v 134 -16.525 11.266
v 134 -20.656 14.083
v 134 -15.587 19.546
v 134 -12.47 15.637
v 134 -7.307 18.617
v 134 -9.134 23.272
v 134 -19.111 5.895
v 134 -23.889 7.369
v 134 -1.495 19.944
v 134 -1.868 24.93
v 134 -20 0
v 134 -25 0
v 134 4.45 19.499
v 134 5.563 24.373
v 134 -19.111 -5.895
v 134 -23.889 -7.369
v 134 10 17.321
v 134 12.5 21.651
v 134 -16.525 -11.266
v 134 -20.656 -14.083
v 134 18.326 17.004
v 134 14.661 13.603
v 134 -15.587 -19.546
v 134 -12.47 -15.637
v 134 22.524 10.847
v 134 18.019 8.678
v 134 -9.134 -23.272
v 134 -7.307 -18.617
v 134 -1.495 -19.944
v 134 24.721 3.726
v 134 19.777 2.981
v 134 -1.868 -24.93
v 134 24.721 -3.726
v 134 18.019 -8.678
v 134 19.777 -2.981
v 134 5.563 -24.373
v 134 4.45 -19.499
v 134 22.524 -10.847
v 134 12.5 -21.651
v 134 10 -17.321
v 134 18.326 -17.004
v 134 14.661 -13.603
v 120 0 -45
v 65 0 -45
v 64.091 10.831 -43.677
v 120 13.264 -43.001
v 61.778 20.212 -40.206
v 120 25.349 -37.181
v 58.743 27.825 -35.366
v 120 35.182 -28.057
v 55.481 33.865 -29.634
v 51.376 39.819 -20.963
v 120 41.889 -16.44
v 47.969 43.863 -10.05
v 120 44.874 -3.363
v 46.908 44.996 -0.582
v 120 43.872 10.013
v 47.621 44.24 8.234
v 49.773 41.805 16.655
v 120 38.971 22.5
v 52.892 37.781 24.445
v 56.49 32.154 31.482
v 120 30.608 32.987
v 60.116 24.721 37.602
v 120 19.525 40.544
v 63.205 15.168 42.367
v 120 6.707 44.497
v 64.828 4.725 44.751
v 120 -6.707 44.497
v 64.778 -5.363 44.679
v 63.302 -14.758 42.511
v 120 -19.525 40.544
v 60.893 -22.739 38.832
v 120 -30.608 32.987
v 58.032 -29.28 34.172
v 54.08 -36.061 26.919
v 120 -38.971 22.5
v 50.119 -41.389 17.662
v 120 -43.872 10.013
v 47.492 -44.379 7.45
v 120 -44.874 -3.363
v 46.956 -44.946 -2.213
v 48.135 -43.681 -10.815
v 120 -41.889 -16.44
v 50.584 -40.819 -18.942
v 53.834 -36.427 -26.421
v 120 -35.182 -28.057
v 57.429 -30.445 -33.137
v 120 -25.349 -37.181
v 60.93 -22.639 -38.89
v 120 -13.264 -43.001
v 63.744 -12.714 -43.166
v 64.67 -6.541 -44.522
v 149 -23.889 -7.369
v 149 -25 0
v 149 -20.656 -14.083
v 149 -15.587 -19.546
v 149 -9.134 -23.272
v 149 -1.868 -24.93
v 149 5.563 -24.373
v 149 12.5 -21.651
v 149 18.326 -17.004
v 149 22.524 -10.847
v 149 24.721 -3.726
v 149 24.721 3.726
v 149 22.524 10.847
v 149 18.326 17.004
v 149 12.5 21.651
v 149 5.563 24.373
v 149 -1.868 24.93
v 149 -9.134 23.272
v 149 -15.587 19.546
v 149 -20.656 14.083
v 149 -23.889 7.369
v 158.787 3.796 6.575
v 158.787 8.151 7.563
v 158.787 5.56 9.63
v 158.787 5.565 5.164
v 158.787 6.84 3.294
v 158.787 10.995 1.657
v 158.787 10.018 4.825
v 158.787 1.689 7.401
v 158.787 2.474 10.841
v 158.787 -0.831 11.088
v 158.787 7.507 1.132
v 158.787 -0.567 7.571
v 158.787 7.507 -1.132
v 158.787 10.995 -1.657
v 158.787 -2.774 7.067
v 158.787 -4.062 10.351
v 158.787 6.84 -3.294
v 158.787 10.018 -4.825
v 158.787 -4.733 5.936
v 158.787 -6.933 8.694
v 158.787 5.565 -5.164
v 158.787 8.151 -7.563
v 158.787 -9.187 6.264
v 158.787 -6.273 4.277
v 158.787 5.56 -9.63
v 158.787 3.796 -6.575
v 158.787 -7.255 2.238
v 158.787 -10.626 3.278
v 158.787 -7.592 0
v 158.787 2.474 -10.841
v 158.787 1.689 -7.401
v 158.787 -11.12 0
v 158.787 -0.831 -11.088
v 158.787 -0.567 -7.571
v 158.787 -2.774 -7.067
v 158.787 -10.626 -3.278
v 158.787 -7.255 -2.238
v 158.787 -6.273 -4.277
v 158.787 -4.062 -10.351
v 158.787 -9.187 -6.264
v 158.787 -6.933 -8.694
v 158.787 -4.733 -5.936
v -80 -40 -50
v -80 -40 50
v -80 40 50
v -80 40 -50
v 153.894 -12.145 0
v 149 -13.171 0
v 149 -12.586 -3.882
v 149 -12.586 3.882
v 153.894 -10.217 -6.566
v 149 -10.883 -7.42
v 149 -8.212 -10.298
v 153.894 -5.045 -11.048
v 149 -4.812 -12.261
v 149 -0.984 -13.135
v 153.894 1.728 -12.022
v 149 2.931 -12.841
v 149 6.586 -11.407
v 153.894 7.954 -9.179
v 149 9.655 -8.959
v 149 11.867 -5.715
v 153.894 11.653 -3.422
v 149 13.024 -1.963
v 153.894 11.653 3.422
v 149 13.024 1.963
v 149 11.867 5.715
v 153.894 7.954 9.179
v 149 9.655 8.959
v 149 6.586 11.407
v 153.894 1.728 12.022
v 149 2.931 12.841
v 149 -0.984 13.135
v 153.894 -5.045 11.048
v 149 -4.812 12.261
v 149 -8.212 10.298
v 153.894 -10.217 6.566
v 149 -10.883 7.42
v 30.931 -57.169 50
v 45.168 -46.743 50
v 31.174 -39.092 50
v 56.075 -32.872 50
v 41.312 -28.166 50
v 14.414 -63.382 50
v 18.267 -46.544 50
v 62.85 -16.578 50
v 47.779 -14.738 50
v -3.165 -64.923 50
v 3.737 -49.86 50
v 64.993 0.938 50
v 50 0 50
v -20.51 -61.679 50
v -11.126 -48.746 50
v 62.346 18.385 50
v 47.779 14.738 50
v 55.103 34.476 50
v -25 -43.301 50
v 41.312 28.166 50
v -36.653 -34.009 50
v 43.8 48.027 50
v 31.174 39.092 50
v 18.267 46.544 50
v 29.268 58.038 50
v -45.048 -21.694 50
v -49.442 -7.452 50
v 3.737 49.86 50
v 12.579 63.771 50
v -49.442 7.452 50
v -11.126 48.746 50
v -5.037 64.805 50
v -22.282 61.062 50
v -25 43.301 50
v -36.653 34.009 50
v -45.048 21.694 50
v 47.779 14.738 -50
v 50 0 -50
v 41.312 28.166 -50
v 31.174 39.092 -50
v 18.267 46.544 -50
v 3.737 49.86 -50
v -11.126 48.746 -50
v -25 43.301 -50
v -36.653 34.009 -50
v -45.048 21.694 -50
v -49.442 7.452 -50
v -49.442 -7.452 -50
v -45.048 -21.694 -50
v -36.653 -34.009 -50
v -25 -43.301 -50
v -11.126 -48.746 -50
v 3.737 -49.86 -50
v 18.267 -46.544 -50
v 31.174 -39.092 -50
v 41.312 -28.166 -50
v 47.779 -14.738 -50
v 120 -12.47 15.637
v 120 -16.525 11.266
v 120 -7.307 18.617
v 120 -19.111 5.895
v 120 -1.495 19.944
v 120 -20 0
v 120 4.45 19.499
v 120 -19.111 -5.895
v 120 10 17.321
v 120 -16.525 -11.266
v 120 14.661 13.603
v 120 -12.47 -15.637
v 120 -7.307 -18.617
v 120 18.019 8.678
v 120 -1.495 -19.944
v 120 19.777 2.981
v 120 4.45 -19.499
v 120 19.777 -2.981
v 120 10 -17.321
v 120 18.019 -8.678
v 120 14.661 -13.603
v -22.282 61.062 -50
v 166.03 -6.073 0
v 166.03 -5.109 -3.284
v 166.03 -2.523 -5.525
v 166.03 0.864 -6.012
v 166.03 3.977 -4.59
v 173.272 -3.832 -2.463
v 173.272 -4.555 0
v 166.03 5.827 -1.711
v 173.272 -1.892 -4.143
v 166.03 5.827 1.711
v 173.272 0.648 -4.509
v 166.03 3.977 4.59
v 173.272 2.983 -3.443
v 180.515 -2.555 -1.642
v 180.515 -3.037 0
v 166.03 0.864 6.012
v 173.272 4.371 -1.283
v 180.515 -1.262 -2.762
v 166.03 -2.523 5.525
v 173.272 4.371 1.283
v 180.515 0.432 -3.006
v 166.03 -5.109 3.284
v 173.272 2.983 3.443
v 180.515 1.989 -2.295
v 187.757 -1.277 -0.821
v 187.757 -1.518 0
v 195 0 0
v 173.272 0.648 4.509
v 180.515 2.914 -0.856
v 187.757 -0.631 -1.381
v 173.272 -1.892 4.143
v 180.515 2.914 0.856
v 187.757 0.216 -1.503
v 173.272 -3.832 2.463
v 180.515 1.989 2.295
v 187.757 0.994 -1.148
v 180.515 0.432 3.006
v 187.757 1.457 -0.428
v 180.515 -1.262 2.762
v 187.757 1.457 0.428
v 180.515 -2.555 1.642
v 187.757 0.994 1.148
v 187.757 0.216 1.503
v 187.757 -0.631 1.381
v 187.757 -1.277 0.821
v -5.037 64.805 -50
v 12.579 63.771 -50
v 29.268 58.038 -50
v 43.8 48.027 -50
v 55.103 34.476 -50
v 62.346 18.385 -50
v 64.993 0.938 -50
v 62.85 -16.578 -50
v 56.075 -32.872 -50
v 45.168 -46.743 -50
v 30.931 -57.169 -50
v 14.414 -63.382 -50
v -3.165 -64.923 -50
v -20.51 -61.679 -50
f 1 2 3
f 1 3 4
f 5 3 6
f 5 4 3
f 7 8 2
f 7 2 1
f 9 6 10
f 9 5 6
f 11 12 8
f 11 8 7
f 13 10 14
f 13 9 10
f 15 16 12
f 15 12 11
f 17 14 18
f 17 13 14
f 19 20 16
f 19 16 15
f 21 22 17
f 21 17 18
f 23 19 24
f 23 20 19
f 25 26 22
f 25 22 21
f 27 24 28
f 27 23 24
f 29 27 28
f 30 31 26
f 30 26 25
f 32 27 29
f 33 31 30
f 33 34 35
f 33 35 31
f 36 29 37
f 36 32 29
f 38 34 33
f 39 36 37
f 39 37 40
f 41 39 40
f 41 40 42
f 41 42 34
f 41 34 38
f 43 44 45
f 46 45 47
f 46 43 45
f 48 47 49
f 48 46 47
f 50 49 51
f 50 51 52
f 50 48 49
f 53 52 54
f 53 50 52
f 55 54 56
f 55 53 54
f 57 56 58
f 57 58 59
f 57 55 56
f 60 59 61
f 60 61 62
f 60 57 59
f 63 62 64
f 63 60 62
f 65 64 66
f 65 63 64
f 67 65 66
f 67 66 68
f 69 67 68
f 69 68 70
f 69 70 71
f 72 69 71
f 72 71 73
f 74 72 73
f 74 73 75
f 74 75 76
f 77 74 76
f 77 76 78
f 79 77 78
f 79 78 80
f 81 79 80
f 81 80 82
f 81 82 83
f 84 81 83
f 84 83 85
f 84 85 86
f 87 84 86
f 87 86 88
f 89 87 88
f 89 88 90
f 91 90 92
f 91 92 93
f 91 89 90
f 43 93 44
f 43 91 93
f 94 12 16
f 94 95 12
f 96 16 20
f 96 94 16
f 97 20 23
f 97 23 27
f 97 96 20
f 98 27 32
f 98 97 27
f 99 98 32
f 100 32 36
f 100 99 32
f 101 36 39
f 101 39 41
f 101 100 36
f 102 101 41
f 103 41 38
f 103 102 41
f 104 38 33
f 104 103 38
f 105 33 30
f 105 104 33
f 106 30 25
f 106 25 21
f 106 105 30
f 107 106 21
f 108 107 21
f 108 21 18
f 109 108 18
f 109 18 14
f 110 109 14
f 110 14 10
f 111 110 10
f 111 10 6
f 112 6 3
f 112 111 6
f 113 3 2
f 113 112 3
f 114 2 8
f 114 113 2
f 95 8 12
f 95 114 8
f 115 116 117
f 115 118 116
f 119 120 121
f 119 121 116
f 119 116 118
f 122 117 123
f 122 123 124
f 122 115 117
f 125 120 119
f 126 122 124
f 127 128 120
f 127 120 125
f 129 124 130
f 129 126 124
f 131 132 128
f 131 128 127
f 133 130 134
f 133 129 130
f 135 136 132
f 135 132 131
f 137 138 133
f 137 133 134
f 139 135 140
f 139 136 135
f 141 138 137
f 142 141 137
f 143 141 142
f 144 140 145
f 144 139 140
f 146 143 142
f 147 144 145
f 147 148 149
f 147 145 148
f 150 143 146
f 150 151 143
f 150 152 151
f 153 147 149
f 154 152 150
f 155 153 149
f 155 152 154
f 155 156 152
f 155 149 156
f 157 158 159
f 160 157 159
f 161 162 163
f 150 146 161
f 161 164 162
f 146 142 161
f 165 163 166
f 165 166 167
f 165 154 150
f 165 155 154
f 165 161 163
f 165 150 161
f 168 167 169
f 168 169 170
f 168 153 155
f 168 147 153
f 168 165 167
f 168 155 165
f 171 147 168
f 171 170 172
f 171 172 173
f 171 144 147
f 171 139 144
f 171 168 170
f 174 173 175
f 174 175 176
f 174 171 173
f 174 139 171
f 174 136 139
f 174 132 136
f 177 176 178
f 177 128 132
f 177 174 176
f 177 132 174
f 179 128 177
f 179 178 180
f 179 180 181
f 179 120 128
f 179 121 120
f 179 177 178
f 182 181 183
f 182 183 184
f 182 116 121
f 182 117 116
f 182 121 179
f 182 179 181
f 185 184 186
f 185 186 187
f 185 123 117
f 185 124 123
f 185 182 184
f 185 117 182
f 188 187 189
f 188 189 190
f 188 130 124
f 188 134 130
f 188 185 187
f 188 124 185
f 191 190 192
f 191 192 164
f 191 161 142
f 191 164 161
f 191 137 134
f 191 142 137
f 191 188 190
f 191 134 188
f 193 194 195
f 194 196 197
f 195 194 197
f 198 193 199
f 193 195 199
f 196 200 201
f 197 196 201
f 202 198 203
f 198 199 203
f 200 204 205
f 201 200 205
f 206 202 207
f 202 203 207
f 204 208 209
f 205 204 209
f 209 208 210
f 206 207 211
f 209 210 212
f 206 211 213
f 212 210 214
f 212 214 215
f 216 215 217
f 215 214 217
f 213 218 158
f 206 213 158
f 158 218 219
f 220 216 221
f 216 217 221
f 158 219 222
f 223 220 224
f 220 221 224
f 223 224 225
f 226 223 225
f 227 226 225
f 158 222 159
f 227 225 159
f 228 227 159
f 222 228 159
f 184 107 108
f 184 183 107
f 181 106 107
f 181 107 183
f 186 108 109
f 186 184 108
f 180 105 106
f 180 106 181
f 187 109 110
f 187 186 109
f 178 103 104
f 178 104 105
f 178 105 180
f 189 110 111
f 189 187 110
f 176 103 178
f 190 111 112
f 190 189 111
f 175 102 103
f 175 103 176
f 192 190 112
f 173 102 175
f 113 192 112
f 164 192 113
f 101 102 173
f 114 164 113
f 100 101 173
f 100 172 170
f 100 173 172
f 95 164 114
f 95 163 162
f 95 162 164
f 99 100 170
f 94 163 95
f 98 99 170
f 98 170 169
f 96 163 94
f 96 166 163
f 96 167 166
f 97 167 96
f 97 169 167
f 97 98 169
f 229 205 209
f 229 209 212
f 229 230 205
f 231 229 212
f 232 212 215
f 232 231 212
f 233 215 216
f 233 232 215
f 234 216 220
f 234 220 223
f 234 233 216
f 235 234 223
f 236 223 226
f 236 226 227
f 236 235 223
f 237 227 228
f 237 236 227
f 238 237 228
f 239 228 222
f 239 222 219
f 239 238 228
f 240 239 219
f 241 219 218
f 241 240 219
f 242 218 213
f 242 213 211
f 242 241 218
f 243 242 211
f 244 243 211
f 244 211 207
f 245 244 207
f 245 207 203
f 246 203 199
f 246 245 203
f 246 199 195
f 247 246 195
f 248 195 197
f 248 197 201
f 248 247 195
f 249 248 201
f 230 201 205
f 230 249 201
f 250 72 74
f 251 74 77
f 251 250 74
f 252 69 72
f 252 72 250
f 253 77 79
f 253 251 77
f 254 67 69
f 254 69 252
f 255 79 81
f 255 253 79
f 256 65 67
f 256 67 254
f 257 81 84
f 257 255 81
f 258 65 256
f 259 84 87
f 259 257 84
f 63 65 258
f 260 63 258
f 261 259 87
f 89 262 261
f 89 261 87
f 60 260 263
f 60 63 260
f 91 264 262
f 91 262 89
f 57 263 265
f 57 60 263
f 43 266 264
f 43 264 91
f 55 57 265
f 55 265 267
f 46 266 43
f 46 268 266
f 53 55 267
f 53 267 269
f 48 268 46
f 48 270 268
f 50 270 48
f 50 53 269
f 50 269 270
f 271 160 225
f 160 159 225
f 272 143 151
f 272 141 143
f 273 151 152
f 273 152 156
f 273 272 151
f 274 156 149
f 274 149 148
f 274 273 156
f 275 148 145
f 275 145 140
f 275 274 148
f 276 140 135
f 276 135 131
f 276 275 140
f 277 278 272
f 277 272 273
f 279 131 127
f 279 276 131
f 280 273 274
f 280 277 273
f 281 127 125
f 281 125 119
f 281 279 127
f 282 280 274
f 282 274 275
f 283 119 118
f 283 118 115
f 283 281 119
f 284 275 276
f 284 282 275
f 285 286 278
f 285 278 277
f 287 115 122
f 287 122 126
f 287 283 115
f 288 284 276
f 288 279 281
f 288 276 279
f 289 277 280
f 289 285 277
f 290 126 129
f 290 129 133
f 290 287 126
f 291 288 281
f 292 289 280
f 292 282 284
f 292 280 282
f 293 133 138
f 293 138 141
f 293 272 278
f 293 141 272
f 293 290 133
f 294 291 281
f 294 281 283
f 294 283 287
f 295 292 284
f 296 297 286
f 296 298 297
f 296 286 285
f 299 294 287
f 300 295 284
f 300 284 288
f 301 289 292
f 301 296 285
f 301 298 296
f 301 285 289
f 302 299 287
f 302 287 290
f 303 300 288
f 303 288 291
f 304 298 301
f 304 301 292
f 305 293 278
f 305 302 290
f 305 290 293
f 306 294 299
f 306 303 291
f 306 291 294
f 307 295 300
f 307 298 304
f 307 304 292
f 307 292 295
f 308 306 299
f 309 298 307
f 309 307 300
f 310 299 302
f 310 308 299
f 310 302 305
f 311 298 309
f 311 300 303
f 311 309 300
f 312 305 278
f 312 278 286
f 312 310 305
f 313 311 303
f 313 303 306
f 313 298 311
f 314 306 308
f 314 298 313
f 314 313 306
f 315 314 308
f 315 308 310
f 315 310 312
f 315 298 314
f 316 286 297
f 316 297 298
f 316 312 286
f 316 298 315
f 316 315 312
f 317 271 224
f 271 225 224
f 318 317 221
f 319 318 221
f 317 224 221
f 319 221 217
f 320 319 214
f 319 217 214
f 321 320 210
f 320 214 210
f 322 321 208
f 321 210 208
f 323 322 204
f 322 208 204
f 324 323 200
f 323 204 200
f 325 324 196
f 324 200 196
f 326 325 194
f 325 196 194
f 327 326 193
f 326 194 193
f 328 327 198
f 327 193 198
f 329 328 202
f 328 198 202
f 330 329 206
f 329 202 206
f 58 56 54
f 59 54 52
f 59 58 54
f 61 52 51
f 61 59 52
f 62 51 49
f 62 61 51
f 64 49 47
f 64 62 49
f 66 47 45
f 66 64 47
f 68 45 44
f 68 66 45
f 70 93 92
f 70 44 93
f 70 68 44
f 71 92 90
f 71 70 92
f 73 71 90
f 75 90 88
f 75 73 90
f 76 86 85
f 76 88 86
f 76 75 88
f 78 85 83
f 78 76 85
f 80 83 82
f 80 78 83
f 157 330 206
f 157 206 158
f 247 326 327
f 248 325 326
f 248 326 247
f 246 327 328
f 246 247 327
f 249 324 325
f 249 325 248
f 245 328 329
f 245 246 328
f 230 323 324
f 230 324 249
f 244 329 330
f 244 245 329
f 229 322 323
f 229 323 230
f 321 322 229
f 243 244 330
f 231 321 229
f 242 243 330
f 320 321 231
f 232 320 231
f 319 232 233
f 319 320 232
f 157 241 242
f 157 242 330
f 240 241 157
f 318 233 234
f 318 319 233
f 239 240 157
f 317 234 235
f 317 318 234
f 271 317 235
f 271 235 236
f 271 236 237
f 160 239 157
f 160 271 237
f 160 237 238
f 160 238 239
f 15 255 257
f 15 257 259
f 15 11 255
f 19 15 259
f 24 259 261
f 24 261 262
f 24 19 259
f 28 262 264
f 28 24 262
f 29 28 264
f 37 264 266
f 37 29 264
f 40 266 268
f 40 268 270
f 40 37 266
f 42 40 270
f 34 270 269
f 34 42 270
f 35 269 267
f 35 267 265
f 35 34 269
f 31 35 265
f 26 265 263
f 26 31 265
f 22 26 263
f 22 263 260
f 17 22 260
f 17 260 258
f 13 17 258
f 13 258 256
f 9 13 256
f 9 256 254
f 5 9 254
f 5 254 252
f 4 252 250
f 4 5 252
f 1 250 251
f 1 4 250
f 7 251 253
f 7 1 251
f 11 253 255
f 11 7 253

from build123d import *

# Parameters (mm, degrees)
SKETCH1_R           = 50
BOSS_EXTRUDE1_DEPTH = 50
BOSS_EXTRUDE2_REACH = 202
SKETCH2_R           = 45


with BuildPart() as part:
    # Sketch1 → Boss-Extrude1 (new body, symmetric)
    with BuildSketch(Plane.XY):
        with BuildLine():
            Line((-80, -40), (-80, 40))
            Line((-80, 40), (-22.281665693, 61.061668614))
            ThreePointArc((-22.281665693, 61.061668614), (64.99323144, 0.938012287), (-20.510212, -61.679260726))
            Line((-20.510212, -61.679260726), (-80, -40))
        make_face()
        Circle(SKETCH1_R, mode=Mode.SUBTRACT)
    extrude(amount=BOSS_EXTRUDE1_DEPTH, both=True)


with BuildPart() as body_2:

    # Sketch2 → Boss-Extrude2 (new body, up to next)
    with BuildSketch(Plane(origin=(120, 0, 0), x_dir=(0, 0, -1), z_dir=(1, 0, 0)), mode=Mode.PRIVATE) as boss_extrude2_sk1:
        Circle(SKETCH2_R)
    boss_extrude2_tool1 = extrude(boss_extrude2_sk1.sketch, amount=-BOSS_EXTRUDE2_REACH, mode=Mode.PRIVATE) - part.part
    add(boss_extrude2_tool1.solids().sort_by_distance((120, 0, 0))[0])

    # Sketch3 → Revolve1 (revolve)
    with BuildSketch(Plane.XY):
        Polygon((120, 0), (120, -20), (134, -20), (134, -25), (149, -25), (149, -13.171383635), (158.787234043, -11.119543048), (158.787234043, -7.591810174), (195, 0), align=None)
    revolve(axis=Axis((0, 0, 0), (1, 0, 0)))


solid = Compound([part.part, body_2.part])
